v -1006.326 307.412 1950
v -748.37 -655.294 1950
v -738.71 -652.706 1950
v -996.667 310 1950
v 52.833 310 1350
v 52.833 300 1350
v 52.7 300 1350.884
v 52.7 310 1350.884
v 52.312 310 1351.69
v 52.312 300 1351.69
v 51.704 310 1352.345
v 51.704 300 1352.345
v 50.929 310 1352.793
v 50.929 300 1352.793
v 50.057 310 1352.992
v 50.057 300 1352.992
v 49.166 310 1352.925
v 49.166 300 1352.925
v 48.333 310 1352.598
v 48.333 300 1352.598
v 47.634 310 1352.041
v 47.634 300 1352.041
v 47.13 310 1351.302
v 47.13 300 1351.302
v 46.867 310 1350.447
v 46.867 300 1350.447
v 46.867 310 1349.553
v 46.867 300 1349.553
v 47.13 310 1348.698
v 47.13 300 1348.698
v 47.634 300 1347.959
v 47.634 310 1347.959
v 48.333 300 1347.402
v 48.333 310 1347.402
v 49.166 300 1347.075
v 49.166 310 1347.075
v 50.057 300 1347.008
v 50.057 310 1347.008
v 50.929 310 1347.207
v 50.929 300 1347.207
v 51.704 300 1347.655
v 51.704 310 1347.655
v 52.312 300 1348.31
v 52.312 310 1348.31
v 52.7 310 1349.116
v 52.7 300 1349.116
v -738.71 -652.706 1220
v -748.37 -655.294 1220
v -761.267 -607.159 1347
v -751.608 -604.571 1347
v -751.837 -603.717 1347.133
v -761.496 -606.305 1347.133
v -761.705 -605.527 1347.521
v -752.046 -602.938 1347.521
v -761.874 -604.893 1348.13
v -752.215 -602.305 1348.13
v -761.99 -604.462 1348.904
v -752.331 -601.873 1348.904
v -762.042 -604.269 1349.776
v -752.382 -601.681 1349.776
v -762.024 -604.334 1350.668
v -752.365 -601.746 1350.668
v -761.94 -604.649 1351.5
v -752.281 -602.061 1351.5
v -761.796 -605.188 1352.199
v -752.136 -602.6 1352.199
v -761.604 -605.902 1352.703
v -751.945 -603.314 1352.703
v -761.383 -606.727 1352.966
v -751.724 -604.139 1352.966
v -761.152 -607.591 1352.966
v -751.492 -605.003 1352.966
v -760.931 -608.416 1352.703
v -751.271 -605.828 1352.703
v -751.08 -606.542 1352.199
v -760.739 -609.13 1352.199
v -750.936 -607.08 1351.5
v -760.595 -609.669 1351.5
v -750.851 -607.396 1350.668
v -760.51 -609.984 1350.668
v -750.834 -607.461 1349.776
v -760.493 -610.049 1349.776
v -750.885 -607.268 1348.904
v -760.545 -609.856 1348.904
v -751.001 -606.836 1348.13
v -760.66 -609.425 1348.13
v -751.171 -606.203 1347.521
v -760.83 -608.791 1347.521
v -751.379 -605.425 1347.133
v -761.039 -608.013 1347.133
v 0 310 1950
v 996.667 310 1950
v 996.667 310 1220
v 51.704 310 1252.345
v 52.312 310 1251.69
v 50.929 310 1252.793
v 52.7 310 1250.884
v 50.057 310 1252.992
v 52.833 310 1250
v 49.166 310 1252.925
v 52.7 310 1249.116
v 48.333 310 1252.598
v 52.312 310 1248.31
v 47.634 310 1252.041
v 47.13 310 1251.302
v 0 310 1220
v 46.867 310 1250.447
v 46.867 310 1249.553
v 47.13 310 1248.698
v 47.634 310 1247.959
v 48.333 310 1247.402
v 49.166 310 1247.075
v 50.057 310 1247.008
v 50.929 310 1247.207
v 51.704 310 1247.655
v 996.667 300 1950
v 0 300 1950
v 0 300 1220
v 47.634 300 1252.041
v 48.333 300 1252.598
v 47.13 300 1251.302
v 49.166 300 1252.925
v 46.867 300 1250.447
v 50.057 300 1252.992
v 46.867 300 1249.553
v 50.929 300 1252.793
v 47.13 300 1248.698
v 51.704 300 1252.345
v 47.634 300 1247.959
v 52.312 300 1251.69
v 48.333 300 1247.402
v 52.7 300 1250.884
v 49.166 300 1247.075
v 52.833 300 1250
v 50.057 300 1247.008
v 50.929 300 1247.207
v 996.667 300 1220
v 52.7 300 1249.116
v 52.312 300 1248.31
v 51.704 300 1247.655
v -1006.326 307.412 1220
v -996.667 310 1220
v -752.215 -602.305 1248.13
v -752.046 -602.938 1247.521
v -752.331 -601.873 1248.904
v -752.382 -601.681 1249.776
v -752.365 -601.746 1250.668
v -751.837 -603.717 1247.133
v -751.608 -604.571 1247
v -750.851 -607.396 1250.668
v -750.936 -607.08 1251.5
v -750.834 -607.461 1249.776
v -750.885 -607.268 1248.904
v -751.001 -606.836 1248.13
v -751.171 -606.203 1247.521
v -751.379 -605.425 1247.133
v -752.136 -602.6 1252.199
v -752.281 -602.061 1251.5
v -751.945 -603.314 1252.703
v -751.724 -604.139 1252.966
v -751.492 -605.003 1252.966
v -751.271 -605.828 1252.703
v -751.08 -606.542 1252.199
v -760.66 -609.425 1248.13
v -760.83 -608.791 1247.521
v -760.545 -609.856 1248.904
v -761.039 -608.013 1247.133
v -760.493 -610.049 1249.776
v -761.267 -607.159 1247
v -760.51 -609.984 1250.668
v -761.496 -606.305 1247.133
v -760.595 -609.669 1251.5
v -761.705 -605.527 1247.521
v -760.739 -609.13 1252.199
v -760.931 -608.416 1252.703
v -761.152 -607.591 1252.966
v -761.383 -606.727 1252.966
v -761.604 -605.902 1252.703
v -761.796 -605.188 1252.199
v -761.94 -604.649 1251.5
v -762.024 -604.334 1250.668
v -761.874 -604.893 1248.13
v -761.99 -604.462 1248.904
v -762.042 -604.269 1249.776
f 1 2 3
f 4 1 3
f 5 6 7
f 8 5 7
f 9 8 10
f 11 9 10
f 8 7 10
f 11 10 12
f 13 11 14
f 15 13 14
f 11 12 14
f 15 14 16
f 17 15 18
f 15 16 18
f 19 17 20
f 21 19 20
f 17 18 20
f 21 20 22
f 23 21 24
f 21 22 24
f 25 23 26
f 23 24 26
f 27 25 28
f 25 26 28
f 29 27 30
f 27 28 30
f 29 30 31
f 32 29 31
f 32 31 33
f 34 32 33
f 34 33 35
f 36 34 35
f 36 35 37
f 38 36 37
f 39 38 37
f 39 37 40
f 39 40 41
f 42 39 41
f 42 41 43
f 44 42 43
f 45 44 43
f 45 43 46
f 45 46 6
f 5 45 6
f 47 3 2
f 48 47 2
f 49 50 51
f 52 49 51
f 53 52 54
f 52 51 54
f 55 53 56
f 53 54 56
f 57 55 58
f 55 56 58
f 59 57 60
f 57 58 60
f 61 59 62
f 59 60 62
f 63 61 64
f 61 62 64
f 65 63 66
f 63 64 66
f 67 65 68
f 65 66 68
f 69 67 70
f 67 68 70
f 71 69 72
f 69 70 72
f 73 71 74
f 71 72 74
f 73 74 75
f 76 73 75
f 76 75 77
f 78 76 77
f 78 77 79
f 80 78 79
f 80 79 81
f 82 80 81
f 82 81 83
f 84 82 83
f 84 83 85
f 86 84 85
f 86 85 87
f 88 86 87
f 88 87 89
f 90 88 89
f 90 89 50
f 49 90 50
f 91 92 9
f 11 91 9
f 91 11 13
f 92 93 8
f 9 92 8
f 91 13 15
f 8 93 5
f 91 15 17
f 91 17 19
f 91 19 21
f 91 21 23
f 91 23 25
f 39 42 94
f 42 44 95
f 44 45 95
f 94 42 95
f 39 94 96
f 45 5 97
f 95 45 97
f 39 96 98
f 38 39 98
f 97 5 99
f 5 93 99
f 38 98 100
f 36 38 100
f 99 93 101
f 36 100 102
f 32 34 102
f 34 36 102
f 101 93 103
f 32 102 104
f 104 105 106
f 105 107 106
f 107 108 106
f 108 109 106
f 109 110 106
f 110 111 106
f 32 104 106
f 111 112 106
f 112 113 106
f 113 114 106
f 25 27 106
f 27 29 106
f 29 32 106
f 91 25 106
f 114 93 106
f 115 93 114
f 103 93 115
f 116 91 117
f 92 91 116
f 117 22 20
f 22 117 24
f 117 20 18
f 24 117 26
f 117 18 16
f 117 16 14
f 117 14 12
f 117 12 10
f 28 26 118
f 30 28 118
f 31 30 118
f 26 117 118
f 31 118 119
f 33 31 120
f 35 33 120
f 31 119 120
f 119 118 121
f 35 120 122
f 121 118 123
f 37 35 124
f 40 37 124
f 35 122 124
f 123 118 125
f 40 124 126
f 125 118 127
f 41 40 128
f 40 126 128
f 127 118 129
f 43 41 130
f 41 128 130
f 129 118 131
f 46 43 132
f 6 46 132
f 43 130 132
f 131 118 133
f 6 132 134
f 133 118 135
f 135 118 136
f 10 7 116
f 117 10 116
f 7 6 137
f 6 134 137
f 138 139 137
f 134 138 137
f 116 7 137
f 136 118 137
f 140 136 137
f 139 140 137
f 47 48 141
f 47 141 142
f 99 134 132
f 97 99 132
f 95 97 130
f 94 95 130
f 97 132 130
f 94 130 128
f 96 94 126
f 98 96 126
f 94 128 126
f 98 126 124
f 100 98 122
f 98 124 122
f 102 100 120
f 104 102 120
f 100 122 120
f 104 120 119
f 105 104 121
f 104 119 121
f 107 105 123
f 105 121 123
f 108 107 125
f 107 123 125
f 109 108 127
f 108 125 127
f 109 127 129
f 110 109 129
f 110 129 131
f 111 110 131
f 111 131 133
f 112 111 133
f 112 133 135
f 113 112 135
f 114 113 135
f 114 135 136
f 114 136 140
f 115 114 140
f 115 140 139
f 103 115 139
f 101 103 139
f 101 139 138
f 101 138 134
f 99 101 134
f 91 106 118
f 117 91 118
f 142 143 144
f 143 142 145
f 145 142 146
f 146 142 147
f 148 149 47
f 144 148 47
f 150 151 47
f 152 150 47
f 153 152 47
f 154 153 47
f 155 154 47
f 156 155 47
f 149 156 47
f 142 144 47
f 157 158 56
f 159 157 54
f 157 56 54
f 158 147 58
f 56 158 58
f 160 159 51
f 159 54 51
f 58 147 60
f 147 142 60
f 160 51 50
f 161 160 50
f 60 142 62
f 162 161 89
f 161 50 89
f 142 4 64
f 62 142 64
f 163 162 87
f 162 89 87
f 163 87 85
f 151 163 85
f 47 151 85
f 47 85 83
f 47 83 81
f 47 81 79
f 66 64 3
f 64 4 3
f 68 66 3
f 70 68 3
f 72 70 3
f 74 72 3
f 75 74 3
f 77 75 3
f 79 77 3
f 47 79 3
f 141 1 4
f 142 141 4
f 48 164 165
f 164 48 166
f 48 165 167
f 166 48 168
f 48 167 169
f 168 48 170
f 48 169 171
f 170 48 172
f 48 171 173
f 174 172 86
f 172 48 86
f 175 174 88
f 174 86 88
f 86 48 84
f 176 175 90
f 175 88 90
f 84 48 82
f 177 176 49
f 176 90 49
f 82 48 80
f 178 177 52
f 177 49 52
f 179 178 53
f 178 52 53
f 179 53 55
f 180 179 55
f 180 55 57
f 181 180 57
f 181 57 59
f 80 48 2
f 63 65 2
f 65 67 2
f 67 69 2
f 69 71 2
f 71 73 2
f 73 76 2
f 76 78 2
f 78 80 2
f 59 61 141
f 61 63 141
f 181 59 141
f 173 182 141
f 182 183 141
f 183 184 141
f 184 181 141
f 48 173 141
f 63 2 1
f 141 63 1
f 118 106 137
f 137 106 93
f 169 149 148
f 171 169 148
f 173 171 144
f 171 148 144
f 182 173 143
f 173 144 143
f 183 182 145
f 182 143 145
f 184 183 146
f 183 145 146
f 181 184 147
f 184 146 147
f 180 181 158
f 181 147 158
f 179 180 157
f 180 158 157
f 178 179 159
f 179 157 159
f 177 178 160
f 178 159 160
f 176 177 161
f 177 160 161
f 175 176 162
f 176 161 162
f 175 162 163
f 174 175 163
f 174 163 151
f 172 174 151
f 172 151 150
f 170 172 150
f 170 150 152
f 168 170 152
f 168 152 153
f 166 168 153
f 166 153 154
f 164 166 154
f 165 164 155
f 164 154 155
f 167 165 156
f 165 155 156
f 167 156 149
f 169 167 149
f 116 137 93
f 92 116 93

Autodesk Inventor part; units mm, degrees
ref_plane "YZ Plane" through (0, 0, 0) normal (1, 0, 0) x (0, 1, 0)
ref_plane "XZ Plane" through (0, 0, 0) normal (0, 1, 0) x (-1, 0, 0)
ref_plane "Plano de trabajo4" through (0, 0, 1220) normal (0, 0, 1) x (1, 0, 0)
sketch "Boceto8" plane through (0, 0, 1220) normal (0, 0, 1) x (1, 0, 0)
  line L0 (480, 0) -> (0, 0) projected
  line L1 (480, 0) -> (480, 10) projected
  line L2 (0, 10) -> (480, 10) projected
  line L3 (0, 0) -> (0, 10) projected
  line L4 (480, 10) -> (0, 10) projected
  line L5 (0, 10) -> (0, 300)
  line L6 (0, 300) -> (996.6667, 300)
  line L7 (996.6667, 300) -> (996.6667, 310)
  line L8 (996.6667, 310) -> (0, 310)
  line L9 (0, 310) -> (0, 300)
  point P0 (0, 0)
  dimension "d38" = 290
  dimension "d39" = 996.6667
  dimension "d40" = 10
extrude "Extrusión8" add sketch "Boceto8" along normal blind 730 contours L9 L8 L7 L6
sketch "Boceto9" plane through (0, 300, 1220) normal (0, -1, 0) x (1, 0, 0)
  line L0 (0, 0) -> (996.6667, 0) construction
  line L1 (996.6667, 0) -> (996.6667, 730) construction
  line L2 (0, 730) -> (996.6667, 730) construction
  line L3 (0, 0) -> (0, 730) construction
  line L4 (0, 80) -> (996.6667, 80) construction
  line L5 (0, 0) -> (996.6667, 0) construction
  line L6 (49.8333, 0) -> (49.8333, 730) construction
  line L7 (0, 730) -> (996.6667, 730) construction
  circle A0 centre (49.8333, 30) radius 3
  circle A1 centre (49.8333, 130) radius 3
  point P0 (0, -1220)
  dimension "d43" = 49.8333
  dimension "d44" = 80
  dimension "d45" = 6
  dimension "d46" = 50
extrude "Extrusión9" cut sketch "Boceto9" against normal up to next
sketch "Boceto10" plane through (0, 0, 1950) normal (0, 0, 1) x (1, 0, 0)
  line L0 (996.6667, 310) -> (0, 310) projected
  line L1 (0, 310) -> (-996.6667, 310)
  line L2 (-996.6667, 310) -> (-738.7104, -652.7061)
  line L3 (-738.7104, -652.7061) -> (-748.3696, -655.2943)
  line L4 (-748.3696, -655.2943) -> (-1006.3259, 307.4118)
  line L5 (-1006.3259, 307.4118) -> (-996.6667, 310)
  point P0 (0, 0)
  dimension "d49" = 996.6667
  dimension "d50" = 996.6667
  dimension "angulo" = 75
  dimension "d52" = 10
  dimension "d53" = 996.6667
extrude "Extrusión10" add sketch "Boceto10" against normal blind 730
sketch "Boceto11" plane through (-738.7104, -652.7061, 1950) normal (0.9659, 0.2588, 0) x (0, 0, -1)
  line L0 (0, 996.6667) -> (0, 0) construction
  line L1 (0, 0) -> (730, 0) construction
  line L2 (730, 996.6667) -> (730, 0) construction
  line L3 (0, 996.6667) -> (730, 996.6667) construction
  line L4 (0, 996.6667) -> (0, 0) construction
  line L5 (0, 49.8333) -> (730, 49.8333) construction
  line L6 (0, 0) -> (730, 0) construction
  line L7 (650, 0) -> (650, 996.6667) construction
  line L8 (0, 996.6667) -> (730, 996.6667) construction
  circle A0 centre (700, 49.8333) radius 3
  circle A1 centre (600, 49.8333) radius 3
  point P0 (1950, 439.2733)
  dimension "d56" = 49.8333
  dimension "d57" = 80
  dimension "d58" = 6
  dimension "d59" = 50
extrude "Extrusión11" cut sketch "Boceto11" against normal up to next
equation "\"d39\" = ancho_m"
equation "\"d40\" = espesor"
equation "\"d43\" = 0.05 * ancho_m"
equation "\"d49\" = ancho_m"
equation "\"d50\" = ancho_m"
equation "\"d52\" = espesor"
equation "\"d53\" = ancho_m"
equation "\"d54\" = h_sup"
equation "\"d56\" = 0.05 * ancho_m"
equation "\"d60\" = h_sup"
equation "\"ancho_m\" = 996.666667"
equation "\"espesor\" = 10"
equation "\"h_sup\" = 730"
properties part number "puerta"
